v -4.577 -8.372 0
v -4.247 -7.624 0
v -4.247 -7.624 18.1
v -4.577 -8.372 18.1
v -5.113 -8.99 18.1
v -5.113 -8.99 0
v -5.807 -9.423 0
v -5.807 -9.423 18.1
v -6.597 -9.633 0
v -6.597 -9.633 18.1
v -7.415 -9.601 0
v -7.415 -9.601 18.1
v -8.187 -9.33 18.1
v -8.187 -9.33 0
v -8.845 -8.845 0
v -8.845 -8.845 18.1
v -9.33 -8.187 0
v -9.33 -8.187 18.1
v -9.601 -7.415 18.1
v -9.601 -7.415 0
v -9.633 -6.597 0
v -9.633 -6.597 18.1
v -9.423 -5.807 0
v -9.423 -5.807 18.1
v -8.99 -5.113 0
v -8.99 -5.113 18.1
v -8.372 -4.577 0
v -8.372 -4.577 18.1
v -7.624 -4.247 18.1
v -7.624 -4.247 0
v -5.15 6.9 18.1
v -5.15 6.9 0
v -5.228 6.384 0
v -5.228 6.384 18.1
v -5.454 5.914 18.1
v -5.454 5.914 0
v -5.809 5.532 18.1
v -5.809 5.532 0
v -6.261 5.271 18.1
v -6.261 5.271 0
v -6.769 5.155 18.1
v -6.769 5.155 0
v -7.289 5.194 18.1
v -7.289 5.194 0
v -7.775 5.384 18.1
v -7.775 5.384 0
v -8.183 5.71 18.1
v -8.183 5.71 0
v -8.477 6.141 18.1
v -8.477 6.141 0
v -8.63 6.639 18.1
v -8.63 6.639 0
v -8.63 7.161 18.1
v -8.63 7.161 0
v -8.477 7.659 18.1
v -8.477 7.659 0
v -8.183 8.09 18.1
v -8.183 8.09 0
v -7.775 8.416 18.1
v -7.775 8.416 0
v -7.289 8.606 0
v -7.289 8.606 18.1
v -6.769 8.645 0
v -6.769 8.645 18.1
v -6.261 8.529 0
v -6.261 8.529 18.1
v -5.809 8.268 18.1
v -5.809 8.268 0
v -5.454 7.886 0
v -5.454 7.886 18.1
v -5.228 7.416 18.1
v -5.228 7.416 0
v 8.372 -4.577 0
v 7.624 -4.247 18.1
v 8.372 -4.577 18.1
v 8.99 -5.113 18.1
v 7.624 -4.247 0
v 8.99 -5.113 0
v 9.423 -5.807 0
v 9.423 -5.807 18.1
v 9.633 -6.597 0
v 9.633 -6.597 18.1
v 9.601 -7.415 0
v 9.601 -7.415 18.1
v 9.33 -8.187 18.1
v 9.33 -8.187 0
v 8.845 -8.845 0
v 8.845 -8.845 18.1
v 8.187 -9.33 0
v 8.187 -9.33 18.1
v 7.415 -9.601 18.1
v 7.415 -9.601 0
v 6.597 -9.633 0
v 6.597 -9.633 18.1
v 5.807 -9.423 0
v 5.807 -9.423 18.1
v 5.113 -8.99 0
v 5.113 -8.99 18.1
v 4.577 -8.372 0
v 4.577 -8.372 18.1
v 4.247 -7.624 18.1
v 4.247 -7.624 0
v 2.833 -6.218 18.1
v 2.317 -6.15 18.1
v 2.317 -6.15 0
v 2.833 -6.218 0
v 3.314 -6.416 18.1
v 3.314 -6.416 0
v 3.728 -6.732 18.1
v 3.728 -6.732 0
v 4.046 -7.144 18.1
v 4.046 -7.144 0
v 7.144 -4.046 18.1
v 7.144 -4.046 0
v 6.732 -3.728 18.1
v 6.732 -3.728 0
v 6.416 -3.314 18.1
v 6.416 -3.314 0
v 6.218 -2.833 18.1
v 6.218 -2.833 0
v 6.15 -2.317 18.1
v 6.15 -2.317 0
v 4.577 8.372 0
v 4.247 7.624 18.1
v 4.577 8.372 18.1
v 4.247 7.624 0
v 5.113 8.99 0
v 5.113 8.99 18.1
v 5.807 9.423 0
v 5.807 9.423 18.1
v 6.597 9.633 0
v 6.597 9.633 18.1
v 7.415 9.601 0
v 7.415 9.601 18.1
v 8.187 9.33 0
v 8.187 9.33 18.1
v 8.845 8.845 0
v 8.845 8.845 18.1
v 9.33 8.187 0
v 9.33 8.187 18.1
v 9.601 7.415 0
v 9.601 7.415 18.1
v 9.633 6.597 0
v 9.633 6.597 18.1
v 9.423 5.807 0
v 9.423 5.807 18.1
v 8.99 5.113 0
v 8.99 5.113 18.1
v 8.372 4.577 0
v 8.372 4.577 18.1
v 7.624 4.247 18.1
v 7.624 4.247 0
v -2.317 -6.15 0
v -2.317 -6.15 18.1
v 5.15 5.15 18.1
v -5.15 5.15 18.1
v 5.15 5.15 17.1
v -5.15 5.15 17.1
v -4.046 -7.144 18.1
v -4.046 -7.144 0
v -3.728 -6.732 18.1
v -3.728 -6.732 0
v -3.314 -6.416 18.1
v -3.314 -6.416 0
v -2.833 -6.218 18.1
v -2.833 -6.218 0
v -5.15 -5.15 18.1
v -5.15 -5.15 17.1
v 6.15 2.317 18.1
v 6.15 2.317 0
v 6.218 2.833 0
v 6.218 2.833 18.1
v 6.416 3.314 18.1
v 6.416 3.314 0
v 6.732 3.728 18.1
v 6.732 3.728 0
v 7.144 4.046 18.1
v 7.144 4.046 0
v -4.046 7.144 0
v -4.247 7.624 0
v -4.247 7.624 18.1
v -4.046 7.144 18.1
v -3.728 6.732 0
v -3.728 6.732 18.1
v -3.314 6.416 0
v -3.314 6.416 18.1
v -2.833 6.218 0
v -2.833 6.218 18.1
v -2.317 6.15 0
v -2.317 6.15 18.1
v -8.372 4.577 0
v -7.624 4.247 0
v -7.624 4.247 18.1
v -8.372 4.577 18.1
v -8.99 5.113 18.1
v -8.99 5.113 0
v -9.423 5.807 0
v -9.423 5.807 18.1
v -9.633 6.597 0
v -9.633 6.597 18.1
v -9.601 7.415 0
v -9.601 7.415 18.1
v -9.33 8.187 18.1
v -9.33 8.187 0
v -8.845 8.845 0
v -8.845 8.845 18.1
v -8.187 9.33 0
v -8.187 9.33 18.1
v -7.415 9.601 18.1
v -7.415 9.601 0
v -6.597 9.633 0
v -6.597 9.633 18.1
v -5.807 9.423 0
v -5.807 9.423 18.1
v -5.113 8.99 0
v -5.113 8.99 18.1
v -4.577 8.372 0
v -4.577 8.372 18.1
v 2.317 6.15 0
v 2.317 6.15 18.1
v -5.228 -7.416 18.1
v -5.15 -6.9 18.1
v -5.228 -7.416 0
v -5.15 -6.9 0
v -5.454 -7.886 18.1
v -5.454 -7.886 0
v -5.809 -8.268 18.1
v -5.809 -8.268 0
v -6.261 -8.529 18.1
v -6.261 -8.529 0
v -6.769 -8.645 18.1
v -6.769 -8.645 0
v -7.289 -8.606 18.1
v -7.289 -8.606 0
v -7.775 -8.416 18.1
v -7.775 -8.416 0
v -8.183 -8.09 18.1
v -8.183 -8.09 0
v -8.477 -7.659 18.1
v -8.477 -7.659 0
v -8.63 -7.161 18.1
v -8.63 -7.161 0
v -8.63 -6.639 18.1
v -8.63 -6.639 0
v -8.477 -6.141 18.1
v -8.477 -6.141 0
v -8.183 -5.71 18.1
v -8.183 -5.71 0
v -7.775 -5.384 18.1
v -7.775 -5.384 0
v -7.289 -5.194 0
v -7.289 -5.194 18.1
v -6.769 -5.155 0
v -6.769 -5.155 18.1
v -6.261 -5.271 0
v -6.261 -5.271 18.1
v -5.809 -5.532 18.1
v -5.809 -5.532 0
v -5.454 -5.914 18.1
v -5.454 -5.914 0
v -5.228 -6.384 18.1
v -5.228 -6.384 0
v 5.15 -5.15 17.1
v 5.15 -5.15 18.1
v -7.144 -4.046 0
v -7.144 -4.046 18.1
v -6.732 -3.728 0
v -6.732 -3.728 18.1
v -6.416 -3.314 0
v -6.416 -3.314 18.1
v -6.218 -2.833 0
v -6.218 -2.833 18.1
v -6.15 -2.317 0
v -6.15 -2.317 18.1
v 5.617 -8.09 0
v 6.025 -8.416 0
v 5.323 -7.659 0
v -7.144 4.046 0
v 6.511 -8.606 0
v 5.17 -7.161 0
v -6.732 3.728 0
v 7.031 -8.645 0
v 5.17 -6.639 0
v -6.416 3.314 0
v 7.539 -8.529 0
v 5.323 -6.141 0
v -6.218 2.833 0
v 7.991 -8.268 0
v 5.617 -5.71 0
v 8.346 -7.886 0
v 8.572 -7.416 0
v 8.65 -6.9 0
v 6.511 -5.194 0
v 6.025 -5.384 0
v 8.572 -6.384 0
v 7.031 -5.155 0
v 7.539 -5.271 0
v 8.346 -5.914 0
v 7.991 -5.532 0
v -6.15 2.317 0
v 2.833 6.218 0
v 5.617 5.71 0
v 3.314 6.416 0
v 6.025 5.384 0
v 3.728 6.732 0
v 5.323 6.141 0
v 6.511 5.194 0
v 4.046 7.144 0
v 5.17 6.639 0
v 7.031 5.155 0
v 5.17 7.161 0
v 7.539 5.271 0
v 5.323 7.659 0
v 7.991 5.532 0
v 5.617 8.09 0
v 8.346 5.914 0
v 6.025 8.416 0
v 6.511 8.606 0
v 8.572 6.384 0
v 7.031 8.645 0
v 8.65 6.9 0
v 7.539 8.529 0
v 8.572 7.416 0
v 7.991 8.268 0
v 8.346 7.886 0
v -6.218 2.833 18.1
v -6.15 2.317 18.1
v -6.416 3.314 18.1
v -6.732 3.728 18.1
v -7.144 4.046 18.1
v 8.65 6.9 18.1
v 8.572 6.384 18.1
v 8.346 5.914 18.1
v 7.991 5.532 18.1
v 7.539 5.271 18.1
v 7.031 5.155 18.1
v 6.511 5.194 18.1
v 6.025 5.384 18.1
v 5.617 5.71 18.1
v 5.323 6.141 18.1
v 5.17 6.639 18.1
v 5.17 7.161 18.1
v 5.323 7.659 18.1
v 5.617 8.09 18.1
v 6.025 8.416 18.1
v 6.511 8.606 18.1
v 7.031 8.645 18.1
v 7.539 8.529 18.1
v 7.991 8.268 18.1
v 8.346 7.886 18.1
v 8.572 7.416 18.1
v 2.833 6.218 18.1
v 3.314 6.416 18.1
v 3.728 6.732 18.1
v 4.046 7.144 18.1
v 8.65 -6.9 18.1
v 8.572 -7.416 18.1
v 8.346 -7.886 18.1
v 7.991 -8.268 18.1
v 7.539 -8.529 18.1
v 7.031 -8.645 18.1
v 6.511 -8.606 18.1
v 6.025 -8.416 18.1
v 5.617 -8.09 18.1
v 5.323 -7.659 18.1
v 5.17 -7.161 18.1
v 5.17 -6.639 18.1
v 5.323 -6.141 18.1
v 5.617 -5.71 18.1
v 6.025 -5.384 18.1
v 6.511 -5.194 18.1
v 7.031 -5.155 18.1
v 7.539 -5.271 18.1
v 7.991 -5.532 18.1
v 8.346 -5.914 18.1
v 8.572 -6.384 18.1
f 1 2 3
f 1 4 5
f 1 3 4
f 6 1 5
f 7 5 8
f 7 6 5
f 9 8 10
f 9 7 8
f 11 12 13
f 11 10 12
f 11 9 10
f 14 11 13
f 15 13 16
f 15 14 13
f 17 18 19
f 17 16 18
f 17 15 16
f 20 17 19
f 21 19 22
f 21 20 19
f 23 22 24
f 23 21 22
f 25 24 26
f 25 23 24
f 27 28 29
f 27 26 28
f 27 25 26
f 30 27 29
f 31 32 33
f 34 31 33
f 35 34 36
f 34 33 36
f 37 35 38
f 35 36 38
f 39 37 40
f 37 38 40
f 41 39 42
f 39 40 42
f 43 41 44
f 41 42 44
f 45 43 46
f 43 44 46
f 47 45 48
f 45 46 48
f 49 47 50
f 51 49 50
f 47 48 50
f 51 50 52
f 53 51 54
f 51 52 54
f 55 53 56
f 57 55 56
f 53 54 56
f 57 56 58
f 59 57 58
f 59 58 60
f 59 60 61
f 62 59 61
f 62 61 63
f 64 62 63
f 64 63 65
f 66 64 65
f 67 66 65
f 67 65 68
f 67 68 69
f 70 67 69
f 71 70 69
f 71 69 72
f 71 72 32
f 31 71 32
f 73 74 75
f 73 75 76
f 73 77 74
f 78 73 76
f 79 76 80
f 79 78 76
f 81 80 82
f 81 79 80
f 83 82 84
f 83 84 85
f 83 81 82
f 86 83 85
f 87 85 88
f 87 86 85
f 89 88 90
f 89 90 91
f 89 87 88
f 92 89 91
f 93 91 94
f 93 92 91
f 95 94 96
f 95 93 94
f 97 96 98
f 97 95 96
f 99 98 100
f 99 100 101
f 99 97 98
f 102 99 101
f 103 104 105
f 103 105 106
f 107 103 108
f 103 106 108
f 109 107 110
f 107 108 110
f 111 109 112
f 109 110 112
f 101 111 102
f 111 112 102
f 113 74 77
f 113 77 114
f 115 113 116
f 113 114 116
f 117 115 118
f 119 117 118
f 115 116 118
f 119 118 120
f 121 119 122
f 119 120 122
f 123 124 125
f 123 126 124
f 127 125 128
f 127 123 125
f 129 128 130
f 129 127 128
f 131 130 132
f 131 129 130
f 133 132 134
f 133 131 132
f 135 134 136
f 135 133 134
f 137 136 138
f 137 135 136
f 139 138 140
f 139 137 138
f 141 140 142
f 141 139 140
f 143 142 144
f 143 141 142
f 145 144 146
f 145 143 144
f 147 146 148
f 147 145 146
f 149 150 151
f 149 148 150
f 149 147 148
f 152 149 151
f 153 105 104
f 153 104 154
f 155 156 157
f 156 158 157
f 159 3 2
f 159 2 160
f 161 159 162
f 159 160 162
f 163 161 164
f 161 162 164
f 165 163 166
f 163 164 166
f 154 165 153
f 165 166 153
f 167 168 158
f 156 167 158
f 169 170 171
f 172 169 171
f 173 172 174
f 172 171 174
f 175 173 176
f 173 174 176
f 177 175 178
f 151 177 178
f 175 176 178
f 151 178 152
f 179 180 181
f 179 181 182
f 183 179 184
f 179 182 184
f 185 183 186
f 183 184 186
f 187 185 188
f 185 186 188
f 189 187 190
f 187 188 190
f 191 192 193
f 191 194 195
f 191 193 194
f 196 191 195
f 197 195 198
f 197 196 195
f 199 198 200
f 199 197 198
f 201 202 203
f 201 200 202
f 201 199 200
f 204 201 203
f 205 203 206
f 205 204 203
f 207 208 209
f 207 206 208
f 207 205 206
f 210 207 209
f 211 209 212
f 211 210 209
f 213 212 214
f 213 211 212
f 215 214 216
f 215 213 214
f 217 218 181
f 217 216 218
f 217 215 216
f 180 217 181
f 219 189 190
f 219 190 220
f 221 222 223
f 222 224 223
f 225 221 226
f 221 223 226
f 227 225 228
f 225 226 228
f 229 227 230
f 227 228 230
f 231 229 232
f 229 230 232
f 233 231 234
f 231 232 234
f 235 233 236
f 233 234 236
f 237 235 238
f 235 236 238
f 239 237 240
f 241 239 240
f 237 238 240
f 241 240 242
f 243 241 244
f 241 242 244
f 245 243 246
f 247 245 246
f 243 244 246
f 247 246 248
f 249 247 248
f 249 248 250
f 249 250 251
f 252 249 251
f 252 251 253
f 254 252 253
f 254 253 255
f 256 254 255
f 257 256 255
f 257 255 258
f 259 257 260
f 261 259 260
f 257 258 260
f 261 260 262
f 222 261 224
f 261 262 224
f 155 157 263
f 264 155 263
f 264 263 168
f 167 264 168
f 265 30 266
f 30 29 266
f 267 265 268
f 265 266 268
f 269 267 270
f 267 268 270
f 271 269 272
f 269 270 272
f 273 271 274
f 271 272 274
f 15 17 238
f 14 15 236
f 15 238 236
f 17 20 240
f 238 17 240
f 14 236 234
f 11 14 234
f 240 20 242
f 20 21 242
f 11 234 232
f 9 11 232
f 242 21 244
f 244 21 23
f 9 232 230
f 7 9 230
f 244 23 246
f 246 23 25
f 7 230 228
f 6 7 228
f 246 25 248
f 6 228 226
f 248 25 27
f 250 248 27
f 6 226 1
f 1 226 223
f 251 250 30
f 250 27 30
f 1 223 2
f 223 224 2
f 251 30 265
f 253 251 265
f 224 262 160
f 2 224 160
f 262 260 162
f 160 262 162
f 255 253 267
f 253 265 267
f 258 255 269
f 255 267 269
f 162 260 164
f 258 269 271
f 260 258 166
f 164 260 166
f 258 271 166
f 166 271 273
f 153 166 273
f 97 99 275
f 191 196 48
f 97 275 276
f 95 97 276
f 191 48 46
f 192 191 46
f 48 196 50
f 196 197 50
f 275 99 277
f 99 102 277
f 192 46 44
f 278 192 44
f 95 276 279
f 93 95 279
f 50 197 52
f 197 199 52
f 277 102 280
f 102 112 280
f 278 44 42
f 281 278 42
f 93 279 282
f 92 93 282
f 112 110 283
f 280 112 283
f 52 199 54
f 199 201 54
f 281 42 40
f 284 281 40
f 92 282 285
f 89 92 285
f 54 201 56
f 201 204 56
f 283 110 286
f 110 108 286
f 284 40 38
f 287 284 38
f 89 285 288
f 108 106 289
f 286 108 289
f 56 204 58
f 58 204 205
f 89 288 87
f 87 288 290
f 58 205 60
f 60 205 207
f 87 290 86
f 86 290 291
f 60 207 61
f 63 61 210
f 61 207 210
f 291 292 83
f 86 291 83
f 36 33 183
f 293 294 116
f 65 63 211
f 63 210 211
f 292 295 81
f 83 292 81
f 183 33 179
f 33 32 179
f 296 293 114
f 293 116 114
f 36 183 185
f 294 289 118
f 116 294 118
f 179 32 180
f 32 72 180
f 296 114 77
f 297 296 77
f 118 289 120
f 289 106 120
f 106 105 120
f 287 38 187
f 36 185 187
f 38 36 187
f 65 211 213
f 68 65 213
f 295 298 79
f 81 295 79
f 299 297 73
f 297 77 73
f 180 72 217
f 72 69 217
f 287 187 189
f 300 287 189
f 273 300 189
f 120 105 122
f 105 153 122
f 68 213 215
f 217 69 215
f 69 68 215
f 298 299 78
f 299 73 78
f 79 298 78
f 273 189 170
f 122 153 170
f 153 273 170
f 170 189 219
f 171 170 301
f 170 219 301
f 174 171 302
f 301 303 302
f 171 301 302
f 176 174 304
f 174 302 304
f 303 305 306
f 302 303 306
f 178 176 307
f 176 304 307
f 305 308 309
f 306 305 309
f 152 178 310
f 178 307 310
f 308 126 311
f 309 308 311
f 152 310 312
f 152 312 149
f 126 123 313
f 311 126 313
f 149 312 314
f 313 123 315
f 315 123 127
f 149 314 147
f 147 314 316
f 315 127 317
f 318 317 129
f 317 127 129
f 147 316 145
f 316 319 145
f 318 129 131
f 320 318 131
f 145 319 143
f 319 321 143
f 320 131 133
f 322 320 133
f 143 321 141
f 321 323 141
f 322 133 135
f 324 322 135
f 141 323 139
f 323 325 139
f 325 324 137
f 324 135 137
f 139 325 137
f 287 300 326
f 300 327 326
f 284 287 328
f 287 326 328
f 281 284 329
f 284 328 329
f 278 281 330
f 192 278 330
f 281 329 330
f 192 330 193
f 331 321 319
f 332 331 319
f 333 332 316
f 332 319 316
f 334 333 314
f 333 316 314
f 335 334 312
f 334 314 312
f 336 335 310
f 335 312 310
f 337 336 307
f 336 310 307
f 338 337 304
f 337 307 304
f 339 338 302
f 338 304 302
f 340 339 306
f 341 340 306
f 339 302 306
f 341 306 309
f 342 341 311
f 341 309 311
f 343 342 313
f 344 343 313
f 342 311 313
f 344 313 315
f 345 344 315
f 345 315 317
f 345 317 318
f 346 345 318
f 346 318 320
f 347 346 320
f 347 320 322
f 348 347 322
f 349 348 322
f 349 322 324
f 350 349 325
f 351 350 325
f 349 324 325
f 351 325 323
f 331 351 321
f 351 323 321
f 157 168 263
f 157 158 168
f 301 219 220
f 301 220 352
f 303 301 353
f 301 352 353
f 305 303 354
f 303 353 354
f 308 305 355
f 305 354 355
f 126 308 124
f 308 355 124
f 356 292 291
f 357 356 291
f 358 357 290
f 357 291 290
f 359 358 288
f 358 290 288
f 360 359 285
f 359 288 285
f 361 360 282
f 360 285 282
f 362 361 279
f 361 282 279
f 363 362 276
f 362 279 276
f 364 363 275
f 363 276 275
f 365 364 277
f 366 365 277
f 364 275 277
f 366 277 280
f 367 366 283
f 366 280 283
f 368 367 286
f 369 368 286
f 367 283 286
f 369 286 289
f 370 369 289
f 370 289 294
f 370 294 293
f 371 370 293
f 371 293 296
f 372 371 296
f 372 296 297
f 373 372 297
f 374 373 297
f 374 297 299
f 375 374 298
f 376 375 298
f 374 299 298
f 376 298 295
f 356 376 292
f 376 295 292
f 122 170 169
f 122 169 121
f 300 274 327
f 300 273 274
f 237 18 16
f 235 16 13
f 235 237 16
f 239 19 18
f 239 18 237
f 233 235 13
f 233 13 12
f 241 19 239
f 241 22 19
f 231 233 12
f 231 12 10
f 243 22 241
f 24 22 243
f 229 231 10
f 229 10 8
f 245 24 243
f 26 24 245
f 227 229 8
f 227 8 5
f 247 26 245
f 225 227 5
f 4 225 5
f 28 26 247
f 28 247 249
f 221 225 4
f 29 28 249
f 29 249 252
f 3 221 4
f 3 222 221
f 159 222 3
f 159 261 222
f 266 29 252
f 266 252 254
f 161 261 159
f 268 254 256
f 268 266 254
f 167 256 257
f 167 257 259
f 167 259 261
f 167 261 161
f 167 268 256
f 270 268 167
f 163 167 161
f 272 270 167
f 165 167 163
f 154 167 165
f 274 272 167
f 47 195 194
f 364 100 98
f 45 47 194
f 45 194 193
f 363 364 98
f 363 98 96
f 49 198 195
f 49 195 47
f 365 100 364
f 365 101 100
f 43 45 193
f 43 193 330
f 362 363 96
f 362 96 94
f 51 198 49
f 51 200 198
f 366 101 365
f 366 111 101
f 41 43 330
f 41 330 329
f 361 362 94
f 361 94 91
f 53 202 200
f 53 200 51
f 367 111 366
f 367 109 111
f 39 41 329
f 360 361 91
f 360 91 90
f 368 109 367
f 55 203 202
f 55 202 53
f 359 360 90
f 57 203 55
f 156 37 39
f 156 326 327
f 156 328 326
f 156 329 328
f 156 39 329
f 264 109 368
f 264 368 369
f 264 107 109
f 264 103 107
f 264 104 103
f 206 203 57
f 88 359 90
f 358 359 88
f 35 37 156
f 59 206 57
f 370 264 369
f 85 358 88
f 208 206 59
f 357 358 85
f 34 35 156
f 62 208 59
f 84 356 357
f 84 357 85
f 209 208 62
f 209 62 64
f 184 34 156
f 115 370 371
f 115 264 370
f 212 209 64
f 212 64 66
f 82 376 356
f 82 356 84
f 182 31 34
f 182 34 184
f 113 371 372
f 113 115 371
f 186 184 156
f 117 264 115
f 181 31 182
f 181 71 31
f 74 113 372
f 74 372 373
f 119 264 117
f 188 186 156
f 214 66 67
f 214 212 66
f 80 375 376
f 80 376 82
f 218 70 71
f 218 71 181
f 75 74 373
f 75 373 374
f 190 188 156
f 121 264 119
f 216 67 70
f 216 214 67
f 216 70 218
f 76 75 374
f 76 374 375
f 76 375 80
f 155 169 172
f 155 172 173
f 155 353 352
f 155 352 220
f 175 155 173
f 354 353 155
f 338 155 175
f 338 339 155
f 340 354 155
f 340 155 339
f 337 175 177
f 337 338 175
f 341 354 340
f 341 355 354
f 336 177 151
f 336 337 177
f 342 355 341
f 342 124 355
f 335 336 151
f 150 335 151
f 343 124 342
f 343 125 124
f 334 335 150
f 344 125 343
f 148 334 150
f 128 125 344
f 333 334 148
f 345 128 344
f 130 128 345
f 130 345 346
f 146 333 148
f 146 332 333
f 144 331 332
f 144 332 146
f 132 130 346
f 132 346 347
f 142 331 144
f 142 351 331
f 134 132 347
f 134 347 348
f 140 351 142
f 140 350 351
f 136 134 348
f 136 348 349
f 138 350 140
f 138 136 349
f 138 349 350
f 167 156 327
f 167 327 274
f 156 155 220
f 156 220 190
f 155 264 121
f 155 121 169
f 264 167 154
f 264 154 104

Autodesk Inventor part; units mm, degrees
ref_plane "YZ Plane" through (0, 0, 0) normal (1, 0, 0) x (0, 1, 0)
ref_plane "XZ Plane" through (0, 0, 0) normal (0, 1, 0) x (-1, 0, 0)
ref_plane "XY Plane" through (0, 0, 0) normal (0, 0, 1) x (1, 0, 0)
sketch "Sketch1" plane through (0, 0, 0) normal (0, 0, 1) x (1, 0, 0)
  line L0 (6.15, -6.15) -> (-6.15, -6.15)
  line L1 (-6.15, -6.15) -> (-6.15, 6.15)
  line L2 (-6.15, 6.15) -> (6.15, 6.15)
  line L3 (6.15, 6.15) -> (6.15, -6.15)
  line L4 (6.15, -6.15) -> (-6.15, 6.15) construction
  line L5 (-6.15, -6.15) -> (6.15, 6.15) construction
  line L6 (5.15, -5.15) -> (-5.15, -5.15)
  line L7 (-5.15, -5.15) -> (-5.15, 5.15)
  line L8 (-5.15, 5.15) -> (5.15, 5.15)
  line L9 (5.15, 5.15) -> (5.15, -5.15)
  line L10 (5.15, -5.15) -> (-5.15, 5.15) construction
  line L11 (-5.15, -5.15) -> (5.15, 5.15) construction
  point P0 (0, 0)
  dimension "d0" = 12.3
  dimension "d1" = 12.3
  dimension "d2" = 10.3
extrude "Extrusion1" add sketch "Sketch1" along normal blind 17.1 contours L6 L7 L8 L9
extrude "Extrusion2" add sketch "Sketch1" along normal blind 18.1
sketch "Sketch2" plane through (0, 0, 0) normal (0, 0, 1) x (1, 0, 0)
  line L0 (-6.15, 6.15) -> (-6.15, -6.15) construction
  line L1 (-6.15, 0) -> (6.15, 0)
  line L2 (6.15, -6.15) -> (6.15, 6.15) construction
  line L3 (6.15, 6.15) -> (-6.15, 6.15) construction
  line L4 (0, 6.15) -> (0, -6.15)
  line L5 (-6.15, -6.15) -> (6.15, -6.15) construction
  point P0 (0, 0)
sketch "Sketch3" plane through (0, 0, 0) normal (0, 0, 1) x (1, 0, 0)
  circle A0 centre (-6.9, 6.9) radius 1.75
  line L0 (-11.15, -11.15) -> (11.15, -11.15) construction
  line L1 (11.15, -11.15) -> (11.15, 11.15) construction
  line L2 (11.15, 11.15) -> (-11.15, 11.15) construction
  line L3 (-11.15, 11.15) -> (-11.15, -11.15) construction
  line L4 (-11.15, -11.15) -> (11.15, 11.15) construction
  line L5 (11.15, -11.15) -> (-11.15, 11.15) construction
  line L6 (-6.15, 6.15) -> (-6.15, -6.15) projected
  line L7 (6.15, 6.15) -> (-6.15, 6.15) projected
  line L8 (-5.15, 5.15) -> (5.15, 5.15) projected
  circle A1 centre (6.9, 6.9) radius 1.75
  circle A2 centre (-6.9, -6.9) radius 1.75
  circle A3 centre (6.9, -6.9) radius 1.75
  line L9 (5.15, -5.15) -> (-5.15, -5.15) projected
  circle A4 centre (-6.9, 6.9) radius 2.75
  circle A5 centre (6.9, 6.9) radius 2.75
  circle A6 centre (6.9, -6.9) radius 2.75
  circle A7 centre (-6.9, -6.9) radius 2.75
  line L10 (5.15, 5.15) -> (-5.15, 5.15) projected
  line L11 (-5.15, 5.15) -> (-5.15, -5.15) projected
  line L12 (-5.15, -5.15) -> (5.15, -5.15) projected
  line L13 (5.15, -5.15) -> (5.15, 5.15) projected
  point P0 (0, 0)
  point P1 (0, 0)
  point P2 (-4.2542, 6.15)
  point P3 (-6.15, 4.2542)
  point P4 (-5.3189, 6.15)
  point P5 (-6.15, 5.3189)
  point P6 (-4.7787, -5.15)
  point P7 (-5.15, -4.7787)
  point P8 (5.15, -4.7787)
  point P9 (4.7787, -5.15)
  point P10 (-5.15, 4.7787)
  point P11 (-4.7787, 5.15)
  point P12 (4.7787, 5.15)
  point P13 (5.15, 5.15)
  point P14 (5.15, 4.7787)
  dimension "d19" = 3.5
  dimension "d20" = 5
  dimension "d21" = 5
  dimension "d22" = 3.5
  dimension "d23" = 3.5
  dimension "d24" = 3.5
  dimension "d25" = 5.5
  dimension "d26" = 5.5
  dimension "d27" = 5.5
  dimension "d28" = 5.5
extrude "Extrusion4" add sketch "Sketch3" along normal up to surface (18.1 mm away) contours A0 L7 L6 | A0 L6 A4 L7 | L6 L7 A0 | A0 L7 A4 L8 L11 L6 | A2 | A7 L11 L9 | A1 | A5 L13 L8 | L9 L13 A6 | A3 picked at (-4.5292, -7.2681) picked at (5.5596, 5.0279) picked at (4.9749, -5.6466)
extrude "Extrusion5" cut sketch "Sketch3" along normal up to next contours A0 L7 L6 | L6 L7 A0 | A2 | A1 | A3
fillet "Fillet1" radius 2 8 edges at (-4.2542, -6.15, 9.05) (-6.15, -4.2542, 9.05) (-6.15, 4.2542, 9.05) (-4.2542, 6.15, 9.05) (4.2542, 6.15, 9.05) (6.15, 4.2542, 9.05) (6.15, -4.2542, 9.05) (4.2542, -6.15, 9.05)
properties part number "base_cube"
